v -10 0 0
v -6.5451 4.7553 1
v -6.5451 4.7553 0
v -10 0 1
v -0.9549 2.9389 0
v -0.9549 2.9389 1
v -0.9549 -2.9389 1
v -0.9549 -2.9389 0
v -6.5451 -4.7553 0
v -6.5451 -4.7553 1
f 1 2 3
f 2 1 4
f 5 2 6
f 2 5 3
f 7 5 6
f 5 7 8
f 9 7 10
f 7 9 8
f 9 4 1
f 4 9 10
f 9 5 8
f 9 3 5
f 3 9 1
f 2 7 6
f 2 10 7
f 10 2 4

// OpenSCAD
mirror([1,0,0]) translate([5,0,0]) cylinder(h=1, r=5,  $fn=5);
%color([0.5,0.5,1], alpha=0.3) translate([5,0,0]) cylinder(h=1, r=5, $fn=5);
